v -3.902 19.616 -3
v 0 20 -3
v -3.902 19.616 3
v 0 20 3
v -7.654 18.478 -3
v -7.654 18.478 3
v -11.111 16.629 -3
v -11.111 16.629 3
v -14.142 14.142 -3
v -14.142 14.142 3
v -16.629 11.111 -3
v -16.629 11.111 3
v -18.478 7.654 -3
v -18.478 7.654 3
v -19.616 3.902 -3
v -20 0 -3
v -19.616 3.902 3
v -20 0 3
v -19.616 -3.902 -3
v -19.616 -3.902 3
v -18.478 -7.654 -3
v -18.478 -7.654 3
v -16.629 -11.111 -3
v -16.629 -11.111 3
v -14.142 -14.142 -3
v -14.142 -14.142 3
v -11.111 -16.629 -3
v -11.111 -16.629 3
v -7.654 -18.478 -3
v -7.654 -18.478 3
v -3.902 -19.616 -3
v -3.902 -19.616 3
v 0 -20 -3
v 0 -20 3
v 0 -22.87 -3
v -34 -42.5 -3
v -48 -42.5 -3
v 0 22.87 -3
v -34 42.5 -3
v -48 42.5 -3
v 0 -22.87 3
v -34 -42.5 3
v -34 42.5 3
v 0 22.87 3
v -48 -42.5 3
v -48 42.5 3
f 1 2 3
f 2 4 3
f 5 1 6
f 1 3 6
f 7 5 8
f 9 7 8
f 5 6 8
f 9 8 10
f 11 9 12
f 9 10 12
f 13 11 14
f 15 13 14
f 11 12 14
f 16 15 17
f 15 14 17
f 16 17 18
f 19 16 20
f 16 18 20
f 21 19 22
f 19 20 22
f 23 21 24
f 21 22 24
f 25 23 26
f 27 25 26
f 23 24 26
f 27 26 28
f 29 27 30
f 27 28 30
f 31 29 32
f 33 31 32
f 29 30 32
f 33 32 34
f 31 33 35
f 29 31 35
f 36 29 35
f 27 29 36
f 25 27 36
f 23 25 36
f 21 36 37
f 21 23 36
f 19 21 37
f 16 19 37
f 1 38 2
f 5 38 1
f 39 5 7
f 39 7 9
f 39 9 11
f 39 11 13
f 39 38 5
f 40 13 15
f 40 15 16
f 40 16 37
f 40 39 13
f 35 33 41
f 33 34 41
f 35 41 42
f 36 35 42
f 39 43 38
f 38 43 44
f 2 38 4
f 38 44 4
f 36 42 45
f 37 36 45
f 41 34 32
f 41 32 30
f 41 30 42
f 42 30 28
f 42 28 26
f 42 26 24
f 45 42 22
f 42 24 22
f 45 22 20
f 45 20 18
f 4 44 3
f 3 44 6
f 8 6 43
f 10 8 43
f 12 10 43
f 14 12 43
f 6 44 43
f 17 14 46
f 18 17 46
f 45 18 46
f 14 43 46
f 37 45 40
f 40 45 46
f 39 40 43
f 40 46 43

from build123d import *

# Parameters (mm, degrees)
BOSS_EXTRUDE1_DEPTH = 3


with BuildPart() as part:
    # Sketch1 → Boss-Extrude1 (new, symmetric)
    with BuildSketch(Plane.XY):
        with BuildLine():
            Line((-48, -42.5), (-48, 42.5))
            Line((-48, 42.5), (-34, 42.5))
            Line((-34, 42.5), (0, 22.870090848))
            Line((0, 22.870090848), (0, 20))
            ThreePointArc((0, 20), (-20, 0), (0, -20))
            Line((0, -20), (0, -22.870090848))
            Line((0, -22.870090848), (-34, -42.5))
            Line((-34, -42.5), (-48, -42.5))
        make_face()
    extrude(amount=BOSS_EXTRUDE1_DEPTH, both=True)


solid = part.part
